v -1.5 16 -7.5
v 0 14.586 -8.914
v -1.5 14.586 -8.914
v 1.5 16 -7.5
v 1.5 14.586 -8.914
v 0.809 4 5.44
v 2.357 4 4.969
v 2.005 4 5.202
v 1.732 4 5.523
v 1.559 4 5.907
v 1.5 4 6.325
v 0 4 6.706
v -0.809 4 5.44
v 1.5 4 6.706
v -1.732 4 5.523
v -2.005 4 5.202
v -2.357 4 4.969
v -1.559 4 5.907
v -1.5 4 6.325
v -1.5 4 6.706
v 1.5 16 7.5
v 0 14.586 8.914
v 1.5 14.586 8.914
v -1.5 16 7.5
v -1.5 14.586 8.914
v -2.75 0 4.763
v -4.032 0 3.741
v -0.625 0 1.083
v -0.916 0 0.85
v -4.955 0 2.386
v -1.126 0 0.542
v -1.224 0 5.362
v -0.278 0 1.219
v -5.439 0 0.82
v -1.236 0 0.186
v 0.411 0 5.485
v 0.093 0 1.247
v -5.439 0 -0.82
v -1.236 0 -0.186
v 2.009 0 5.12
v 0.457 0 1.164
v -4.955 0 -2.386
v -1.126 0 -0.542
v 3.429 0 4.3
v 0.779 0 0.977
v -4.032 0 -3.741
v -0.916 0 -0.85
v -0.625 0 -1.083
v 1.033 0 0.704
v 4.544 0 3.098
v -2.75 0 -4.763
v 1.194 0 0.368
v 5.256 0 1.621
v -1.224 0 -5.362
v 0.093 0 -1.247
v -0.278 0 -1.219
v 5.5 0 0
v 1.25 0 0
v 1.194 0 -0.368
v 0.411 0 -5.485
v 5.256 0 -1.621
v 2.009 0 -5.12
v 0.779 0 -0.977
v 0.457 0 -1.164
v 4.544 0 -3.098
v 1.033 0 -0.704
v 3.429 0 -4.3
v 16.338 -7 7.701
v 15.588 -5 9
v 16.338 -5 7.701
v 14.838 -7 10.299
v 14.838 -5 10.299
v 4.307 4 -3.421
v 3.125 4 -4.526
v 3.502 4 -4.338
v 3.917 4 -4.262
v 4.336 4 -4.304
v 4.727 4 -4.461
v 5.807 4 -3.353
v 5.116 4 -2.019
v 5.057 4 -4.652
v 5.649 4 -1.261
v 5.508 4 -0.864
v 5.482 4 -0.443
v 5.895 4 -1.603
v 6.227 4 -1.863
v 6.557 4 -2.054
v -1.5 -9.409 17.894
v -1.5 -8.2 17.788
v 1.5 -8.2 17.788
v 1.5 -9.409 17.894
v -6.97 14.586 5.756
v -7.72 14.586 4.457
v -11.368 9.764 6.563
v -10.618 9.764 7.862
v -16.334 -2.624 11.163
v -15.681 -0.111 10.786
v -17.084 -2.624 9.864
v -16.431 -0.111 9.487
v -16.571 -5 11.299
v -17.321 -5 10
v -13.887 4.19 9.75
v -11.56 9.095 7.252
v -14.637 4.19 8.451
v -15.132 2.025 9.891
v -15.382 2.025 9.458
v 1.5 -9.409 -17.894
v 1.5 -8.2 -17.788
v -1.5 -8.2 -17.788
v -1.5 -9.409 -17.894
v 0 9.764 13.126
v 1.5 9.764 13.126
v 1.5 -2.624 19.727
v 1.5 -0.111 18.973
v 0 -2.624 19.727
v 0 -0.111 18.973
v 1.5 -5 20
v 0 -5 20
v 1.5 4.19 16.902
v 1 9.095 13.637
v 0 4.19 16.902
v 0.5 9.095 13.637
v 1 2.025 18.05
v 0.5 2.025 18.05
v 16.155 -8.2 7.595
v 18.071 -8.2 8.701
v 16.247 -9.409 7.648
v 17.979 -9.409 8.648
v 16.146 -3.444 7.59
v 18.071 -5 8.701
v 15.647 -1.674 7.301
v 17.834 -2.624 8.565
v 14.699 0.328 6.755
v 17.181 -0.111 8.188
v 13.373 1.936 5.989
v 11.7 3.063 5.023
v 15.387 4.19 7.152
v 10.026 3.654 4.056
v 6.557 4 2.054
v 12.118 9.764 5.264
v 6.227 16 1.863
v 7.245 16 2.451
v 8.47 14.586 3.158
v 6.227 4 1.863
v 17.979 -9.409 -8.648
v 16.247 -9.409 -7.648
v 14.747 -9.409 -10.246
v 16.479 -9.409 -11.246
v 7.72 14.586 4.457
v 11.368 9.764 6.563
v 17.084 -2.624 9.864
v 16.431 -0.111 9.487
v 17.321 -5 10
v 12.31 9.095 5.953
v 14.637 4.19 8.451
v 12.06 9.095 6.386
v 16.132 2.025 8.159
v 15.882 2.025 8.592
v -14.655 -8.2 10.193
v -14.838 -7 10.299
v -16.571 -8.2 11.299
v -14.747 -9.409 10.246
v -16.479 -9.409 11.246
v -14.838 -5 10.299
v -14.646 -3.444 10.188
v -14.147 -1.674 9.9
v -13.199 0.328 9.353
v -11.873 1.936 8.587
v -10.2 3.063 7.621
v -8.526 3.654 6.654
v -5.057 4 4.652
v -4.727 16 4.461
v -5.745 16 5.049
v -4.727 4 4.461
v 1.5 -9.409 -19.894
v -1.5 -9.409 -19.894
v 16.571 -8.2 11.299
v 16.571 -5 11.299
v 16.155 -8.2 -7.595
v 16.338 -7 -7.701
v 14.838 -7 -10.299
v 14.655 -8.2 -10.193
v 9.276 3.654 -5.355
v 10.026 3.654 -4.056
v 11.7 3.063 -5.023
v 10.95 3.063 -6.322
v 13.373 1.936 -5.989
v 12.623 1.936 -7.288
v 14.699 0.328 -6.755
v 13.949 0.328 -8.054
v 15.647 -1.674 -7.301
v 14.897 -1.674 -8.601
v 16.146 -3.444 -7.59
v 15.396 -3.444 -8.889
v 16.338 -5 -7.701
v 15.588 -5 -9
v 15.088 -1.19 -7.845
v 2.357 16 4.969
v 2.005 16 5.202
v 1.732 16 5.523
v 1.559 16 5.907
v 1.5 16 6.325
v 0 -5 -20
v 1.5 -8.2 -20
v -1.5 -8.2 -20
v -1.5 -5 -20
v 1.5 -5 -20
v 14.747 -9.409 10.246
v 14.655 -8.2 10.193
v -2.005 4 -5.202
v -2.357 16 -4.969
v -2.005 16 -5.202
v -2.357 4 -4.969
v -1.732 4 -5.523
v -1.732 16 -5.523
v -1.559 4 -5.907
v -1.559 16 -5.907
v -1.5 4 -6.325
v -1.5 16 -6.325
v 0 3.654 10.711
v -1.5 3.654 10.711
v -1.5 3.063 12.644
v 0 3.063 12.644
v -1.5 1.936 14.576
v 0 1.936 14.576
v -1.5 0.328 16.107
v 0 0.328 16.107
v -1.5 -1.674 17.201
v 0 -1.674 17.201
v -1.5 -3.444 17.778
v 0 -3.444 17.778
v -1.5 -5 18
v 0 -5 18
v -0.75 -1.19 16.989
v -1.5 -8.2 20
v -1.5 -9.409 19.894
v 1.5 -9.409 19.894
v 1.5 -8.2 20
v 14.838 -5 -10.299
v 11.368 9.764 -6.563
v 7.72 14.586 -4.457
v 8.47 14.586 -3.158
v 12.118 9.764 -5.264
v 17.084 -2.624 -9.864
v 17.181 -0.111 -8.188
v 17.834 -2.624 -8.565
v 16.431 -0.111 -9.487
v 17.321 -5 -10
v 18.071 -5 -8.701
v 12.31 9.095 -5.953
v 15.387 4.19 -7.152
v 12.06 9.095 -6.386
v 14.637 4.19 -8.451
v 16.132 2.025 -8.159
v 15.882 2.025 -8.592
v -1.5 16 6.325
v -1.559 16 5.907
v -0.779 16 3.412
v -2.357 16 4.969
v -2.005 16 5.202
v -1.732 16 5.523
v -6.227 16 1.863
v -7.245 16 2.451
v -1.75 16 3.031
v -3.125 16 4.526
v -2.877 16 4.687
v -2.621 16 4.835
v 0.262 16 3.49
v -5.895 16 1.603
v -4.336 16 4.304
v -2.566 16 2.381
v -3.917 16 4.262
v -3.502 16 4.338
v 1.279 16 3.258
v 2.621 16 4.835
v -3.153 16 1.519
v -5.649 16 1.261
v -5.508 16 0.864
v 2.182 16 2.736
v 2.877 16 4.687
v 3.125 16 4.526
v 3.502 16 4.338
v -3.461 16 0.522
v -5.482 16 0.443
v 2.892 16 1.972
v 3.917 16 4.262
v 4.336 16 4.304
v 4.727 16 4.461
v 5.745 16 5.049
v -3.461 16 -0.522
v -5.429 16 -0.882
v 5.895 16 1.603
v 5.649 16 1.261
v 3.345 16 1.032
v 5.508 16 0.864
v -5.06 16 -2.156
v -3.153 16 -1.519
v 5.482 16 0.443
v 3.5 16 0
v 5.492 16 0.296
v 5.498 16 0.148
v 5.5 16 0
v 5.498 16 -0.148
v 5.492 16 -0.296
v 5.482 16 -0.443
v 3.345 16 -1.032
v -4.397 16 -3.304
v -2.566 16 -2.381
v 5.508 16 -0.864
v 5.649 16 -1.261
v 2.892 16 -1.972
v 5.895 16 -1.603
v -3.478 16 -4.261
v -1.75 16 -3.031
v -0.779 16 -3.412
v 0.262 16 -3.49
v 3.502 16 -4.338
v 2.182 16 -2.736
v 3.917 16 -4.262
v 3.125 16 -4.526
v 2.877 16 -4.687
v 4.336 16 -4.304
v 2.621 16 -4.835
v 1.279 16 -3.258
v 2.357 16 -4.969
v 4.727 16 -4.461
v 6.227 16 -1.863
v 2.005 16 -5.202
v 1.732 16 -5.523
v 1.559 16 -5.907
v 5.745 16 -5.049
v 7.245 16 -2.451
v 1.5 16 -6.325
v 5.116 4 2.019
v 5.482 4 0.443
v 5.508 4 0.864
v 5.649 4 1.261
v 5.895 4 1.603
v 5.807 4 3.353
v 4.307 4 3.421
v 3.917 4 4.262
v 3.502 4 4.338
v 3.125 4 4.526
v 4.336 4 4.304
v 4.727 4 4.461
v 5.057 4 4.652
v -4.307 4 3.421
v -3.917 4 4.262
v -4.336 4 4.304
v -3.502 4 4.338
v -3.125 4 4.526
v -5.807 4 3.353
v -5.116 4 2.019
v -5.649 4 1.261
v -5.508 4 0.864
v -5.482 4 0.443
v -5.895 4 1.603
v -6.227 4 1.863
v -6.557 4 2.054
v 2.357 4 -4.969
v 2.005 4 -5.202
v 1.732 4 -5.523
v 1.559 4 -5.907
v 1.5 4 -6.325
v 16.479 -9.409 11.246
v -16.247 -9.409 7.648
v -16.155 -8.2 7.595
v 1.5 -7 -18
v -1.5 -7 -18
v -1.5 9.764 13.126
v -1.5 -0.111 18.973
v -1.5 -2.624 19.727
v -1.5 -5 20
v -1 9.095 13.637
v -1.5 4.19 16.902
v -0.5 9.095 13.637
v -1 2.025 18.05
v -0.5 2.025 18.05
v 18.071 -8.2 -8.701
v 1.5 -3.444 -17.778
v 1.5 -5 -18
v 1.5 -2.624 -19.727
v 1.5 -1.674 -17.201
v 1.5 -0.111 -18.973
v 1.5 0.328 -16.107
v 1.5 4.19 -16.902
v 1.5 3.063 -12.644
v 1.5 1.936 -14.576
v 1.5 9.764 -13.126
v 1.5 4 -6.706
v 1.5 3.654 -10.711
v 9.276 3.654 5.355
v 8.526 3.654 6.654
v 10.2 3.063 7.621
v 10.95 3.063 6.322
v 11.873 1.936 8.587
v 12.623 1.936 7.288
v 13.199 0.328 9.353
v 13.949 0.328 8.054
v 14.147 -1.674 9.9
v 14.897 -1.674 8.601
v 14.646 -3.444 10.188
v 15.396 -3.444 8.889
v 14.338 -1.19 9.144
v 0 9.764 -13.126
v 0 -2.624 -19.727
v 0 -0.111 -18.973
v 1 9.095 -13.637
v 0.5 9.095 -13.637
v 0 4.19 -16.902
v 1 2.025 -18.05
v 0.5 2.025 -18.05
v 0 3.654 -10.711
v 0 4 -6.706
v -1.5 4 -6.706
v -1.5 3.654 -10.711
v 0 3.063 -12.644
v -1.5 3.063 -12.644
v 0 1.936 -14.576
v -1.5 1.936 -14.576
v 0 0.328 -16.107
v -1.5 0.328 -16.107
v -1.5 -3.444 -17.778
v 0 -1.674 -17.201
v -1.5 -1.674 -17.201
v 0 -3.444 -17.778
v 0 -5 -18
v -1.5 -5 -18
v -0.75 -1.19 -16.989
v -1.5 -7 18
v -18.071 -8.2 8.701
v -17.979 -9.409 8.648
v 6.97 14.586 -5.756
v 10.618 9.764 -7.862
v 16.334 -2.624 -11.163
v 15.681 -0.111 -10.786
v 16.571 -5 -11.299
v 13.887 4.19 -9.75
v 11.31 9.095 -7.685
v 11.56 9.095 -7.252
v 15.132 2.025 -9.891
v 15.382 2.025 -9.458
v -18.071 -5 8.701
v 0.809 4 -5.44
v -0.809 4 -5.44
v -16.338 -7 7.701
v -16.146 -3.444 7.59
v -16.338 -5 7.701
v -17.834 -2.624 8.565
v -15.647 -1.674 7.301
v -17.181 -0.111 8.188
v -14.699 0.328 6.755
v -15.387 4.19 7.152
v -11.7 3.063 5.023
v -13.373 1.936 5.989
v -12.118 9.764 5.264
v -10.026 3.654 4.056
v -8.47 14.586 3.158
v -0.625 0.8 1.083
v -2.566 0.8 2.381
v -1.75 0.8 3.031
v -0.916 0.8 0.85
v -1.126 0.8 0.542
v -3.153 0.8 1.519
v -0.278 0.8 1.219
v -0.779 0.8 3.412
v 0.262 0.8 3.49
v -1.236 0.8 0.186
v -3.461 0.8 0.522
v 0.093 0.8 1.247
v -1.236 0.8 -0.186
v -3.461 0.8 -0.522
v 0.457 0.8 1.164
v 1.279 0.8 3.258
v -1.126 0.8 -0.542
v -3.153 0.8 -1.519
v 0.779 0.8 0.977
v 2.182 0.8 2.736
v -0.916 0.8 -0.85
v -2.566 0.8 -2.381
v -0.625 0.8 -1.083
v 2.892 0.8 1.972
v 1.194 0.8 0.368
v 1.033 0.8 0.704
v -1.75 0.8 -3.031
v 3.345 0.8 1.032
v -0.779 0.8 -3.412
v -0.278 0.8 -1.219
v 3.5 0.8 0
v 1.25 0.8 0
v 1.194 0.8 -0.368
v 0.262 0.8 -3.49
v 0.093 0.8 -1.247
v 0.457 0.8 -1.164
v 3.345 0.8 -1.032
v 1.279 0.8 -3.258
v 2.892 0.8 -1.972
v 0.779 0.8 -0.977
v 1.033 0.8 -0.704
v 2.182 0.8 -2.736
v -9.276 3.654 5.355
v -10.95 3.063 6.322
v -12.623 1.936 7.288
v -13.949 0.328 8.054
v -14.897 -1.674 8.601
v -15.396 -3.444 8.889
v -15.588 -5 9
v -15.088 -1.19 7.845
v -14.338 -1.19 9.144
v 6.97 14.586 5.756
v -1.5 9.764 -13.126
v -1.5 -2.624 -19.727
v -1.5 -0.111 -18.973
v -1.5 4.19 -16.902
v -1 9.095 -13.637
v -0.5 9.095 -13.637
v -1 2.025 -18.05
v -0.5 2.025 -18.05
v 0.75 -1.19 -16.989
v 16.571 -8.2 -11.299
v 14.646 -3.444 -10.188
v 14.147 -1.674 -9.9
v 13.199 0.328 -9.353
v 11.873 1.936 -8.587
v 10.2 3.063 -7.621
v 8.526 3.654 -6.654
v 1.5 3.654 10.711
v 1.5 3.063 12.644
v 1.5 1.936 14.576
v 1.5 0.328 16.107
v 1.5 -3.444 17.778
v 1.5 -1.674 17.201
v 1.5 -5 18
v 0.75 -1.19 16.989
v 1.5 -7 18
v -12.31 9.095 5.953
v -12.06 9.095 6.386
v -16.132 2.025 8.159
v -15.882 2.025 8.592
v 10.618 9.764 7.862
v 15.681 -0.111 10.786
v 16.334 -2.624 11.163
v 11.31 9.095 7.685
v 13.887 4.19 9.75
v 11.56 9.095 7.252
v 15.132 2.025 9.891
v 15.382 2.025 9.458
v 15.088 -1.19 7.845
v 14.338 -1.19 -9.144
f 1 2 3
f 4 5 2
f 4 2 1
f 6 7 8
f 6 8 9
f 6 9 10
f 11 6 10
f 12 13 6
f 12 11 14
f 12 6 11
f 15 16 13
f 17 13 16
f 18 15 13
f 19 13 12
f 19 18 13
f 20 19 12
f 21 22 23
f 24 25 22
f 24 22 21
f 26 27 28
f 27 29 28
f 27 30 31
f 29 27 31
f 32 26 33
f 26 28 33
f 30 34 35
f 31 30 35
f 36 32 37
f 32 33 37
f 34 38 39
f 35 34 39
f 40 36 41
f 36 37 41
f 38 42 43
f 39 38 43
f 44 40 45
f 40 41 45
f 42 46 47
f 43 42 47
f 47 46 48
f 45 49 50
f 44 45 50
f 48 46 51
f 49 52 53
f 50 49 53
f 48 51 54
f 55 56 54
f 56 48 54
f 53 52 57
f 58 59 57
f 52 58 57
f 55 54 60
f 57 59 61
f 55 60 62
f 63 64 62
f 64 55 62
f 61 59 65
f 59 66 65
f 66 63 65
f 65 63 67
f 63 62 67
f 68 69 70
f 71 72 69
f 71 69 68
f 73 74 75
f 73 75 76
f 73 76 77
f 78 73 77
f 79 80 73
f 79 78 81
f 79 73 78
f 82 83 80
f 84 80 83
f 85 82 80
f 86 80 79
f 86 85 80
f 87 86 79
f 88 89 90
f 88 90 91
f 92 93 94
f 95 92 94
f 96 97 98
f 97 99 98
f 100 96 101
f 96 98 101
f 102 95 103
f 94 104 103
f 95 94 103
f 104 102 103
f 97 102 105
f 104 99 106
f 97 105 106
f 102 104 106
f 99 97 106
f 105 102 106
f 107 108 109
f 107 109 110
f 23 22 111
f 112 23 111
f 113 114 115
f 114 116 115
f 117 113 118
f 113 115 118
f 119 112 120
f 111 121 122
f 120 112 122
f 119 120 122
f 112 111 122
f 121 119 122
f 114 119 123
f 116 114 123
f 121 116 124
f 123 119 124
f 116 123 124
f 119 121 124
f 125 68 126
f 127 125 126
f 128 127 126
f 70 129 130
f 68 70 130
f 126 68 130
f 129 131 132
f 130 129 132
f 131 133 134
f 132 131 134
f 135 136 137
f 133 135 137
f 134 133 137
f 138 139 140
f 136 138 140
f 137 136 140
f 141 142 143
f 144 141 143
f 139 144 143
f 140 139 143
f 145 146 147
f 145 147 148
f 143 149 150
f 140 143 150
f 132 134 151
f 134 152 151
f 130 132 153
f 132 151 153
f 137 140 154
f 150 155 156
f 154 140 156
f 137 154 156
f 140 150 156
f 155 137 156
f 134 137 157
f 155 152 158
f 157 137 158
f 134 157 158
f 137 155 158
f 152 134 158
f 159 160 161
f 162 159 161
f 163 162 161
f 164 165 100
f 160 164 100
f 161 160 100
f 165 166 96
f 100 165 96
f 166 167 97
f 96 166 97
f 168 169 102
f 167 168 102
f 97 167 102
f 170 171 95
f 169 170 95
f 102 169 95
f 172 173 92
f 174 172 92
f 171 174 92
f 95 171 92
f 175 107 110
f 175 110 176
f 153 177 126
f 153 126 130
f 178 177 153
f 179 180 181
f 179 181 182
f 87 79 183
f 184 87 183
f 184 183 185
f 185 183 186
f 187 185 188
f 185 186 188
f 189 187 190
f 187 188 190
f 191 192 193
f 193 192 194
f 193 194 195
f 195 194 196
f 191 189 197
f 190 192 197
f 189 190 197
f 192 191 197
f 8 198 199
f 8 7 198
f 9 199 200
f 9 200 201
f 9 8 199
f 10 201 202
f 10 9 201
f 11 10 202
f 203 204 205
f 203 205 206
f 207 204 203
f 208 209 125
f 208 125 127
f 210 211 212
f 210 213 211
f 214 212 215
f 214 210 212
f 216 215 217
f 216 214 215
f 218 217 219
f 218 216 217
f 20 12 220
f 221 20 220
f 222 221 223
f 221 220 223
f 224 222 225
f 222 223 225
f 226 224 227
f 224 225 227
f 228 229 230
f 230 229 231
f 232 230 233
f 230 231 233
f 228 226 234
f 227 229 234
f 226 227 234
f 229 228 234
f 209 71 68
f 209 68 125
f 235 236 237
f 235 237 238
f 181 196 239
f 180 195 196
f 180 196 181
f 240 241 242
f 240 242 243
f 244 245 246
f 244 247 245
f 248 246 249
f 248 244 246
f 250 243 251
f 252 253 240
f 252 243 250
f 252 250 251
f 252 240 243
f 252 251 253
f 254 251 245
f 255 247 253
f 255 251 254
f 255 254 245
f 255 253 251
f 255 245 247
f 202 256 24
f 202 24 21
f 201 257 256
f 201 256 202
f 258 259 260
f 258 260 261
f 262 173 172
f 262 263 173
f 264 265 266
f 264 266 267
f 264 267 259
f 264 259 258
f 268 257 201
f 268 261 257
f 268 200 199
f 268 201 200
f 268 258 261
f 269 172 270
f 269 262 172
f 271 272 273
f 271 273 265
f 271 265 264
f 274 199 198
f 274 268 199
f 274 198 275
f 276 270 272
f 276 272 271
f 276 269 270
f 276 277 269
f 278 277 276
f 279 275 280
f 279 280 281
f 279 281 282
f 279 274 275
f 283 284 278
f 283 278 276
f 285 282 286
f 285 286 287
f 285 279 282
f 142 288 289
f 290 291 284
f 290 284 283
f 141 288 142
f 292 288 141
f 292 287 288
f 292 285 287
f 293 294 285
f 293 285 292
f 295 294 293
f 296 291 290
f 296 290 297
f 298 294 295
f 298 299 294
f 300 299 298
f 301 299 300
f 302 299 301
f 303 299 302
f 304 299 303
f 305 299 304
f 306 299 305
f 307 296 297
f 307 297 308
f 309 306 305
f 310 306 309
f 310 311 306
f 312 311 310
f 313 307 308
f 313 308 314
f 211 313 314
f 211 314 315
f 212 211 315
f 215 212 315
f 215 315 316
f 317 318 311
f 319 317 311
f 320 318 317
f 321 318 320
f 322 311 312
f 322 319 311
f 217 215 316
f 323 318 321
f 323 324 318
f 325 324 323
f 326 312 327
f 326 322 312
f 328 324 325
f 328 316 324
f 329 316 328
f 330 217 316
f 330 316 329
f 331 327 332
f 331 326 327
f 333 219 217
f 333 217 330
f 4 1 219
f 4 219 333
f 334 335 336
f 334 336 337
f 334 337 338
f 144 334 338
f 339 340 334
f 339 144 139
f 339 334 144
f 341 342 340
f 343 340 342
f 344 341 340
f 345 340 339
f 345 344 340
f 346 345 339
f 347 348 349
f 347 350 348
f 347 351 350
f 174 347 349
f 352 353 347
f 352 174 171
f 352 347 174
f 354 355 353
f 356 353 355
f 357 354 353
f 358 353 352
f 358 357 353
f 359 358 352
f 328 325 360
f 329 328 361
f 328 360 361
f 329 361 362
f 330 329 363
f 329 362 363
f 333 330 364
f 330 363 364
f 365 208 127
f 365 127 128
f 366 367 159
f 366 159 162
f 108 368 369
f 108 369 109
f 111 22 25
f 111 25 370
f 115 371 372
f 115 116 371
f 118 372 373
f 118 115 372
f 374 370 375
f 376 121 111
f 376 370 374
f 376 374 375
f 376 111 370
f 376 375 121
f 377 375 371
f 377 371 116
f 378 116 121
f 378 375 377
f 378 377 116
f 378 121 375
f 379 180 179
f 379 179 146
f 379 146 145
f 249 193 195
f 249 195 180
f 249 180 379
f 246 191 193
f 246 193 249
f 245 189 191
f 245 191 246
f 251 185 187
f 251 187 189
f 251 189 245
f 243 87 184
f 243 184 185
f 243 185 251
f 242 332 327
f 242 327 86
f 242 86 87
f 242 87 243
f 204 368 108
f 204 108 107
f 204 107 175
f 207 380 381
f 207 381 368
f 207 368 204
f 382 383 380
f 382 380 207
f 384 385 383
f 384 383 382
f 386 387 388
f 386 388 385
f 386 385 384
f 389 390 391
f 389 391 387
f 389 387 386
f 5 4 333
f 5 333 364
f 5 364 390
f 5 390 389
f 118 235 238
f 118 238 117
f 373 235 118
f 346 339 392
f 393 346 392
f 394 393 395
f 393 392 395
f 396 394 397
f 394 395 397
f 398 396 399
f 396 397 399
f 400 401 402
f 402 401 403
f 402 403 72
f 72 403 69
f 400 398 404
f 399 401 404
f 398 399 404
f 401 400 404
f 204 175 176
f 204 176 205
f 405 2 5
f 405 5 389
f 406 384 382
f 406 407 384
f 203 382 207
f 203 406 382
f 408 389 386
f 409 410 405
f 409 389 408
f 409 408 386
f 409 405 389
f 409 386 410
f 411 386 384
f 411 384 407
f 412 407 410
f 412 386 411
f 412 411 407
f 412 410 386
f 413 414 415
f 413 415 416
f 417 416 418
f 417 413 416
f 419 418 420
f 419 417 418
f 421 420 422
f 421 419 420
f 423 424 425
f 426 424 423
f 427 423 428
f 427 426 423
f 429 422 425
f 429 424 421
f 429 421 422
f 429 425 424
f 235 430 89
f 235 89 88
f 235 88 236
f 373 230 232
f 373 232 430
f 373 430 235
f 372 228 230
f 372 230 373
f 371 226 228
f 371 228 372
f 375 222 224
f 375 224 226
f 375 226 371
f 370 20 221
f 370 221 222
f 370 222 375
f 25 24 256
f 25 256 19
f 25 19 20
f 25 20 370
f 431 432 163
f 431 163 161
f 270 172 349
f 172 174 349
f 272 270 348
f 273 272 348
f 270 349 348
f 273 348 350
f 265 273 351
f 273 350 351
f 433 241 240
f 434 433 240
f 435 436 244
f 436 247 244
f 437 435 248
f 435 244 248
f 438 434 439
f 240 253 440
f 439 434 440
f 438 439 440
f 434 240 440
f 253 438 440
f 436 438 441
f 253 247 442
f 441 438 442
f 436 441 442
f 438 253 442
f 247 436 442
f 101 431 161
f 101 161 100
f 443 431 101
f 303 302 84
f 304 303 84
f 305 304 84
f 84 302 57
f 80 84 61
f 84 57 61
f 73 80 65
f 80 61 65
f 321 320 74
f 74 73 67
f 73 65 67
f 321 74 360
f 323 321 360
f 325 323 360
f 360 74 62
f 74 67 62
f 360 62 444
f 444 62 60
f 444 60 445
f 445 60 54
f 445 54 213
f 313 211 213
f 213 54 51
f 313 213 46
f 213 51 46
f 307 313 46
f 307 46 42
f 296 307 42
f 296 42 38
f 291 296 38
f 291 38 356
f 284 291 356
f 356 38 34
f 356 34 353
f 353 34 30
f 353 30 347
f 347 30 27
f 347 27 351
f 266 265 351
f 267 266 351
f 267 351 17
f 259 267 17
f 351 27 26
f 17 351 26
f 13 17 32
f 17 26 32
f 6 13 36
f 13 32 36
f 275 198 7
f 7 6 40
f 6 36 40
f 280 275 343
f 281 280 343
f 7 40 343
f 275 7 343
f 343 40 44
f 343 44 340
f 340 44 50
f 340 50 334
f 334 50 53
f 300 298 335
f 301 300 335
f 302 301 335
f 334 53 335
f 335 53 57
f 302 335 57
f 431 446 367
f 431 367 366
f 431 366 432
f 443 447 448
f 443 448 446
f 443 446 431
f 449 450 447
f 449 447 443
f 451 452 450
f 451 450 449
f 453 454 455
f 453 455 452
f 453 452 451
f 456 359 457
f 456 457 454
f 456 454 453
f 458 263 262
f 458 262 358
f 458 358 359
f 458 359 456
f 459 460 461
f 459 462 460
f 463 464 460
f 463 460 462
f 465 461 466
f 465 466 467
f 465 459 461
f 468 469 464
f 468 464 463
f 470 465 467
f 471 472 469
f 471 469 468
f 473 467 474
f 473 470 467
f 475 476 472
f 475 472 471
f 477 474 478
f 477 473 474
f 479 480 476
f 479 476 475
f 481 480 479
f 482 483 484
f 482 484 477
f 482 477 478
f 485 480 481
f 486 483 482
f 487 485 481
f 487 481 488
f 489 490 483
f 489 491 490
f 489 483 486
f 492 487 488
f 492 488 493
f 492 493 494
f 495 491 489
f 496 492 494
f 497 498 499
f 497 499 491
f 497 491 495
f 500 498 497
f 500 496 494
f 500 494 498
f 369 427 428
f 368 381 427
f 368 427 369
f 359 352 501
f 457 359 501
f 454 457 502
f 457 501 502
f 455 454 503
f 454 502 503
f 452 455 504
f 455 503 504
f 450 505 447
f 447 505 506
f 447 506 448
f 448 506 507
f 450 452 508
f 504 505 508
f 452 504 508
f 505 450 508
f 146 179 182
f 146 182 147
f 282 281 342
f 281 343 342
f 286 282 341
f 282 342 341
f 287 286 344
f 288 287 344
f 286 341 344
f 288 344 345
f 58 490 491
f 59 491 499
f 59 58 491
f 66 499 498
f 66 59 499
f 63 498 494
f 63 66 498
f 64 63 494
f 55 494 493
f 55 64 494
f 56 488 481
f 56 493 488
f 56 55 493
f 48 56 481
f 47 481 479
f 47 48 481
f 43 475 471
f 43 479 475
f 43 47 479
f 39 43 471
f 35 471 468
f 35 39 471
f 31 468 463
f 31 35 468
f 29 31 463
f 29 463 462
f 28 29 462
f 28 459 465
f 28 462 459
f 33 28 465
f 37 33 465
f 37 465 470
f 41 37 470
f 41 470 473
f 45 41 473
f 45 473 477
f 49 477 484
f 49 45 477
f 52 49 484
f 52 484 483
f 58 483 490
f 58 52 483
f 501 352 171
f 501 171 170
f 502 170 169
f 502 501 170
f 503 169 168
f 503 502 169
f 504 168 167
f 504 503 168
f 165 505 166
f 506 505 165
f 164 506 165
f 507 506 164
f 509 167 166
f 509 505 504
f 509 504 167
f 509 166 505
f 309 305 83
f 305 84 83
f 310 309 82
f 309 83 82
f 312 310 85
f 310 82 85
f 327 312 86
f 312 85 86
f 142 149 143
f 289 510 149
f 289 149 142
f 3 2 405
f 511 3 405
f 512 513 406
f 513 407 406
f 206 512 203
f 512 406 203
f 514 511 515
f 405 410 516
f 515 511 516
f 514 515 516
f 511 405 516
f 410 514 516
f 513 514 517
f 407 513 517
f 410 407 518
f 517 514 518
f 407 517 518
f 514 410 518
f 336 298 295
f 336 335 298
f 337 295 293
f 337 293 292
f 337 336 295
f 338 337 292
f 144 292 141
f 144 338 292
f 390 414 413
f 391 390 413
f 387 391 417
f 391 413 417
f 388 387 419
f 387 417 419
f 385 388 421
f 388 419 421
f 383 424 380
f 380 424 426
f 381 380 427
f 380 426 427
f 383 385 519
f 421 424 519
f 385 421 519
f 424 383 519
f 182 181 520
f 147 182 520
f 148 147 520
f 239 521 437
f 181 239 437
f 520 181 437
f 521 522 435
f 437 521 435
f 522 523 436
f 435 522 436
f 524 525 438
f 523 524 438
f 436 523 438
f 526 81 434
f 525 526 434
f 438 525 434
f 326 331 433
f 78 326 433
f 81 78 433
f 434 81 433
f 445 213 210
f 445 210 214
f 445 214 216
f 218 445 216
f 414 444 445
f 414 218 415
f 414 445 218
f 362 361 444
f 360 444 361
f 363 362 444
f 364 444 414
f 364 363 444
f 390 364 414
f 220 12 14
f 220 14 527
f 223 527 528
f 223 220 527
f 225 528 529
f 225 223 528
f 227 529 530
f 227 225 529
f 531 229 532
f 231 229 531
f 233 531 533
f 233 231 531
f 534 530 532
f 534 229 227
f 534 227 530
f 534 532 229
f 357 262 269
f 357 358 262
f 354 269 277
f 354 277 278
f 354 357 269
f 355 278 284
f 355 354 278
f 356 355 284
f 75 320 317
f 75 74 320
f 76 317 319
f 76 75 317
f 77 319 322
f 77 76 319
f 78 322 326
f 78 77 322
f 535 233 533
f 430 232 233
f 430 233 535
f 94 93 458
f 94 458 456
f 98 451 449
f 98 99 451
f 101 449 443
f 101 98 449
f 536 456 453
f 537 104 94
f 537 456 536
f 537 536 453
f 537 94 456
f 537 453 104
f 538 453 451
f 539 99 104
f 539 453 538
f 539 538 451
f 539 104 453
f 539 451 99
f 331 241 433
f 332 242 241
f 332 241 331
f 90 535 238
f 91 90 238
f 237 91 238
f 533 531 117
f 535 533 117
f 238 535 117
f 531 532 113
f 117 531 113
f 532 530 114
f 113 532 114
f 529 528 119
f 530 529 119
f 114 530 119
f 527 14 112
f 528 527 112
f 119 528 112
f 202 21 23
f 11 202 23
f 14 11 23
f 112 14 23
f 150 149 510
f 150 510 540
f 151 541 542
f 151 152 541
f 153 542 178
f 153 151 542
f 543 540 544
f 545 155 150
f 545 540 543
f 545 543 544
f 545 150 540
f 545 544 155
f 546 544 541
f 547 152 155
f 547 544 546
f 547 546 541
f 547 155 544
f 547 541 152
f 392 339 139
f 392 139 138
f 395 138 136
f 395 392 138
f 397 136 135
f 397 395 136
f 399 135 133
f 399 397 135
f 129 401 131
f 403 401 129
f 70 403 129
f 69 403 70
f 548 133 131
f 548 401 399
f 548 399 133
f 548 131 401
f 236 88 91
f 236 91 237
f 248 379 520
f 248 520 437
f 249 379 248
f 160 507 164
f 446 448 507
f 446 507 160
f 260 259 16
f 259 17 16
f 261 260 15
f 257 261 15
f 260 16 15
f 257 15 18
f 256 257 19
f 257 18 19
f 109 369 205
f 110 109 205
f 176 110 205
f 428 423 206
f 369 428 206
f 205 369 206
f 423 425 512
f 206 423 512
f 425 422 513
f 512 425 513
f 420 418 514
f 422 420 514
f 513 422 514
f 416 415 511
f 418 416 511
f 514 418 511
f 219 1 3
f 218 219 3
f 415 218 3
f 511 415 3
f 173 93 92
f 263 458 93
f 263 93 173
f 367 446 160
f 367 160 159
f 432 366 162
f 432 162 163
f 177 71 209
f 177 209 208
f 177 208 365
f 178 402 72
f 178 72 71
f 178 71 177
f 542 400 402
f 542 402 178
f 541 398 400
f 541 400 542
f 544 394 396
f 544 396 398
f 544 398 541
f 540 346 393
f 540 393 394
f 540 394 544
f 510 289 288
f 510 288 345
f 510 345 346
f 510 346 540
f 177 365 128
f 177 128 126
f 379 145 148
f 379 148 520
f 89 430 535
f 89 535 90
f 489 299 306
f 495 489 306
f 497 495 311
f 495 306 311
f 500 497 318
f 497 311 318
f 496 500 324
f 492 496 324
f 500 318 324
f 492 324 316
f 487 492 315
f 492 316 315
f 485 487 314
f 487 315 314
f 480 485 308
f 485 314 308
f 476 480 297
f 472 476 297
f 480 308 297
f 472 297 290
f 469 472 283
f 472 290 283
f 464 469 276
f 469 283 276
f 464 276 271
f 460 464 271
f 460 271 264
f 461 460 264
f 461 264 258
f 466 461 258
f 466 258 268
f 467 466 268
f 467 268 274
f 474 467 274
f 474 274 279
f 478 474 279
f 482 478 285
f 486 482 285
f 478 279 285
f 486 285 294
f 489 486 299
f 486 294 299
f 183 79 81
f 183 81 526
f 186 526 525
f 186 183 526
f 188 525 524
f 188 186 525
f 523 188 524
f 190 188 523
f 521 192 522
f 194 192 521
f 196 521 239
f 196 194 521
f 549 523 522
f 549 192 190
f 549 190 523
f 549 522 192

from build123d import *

# Parameters (mm, degrees)
SKETCH1_R           = 5.5
SKETCH1_R_2         = 1.25
BOSS_EXTRUDE1_DEPTH = 16
BOSS_EXTRUDE2_DEPTH = 1.5
BOSS_EXTRUDE3_DEPTH = 3
CIRPATTERN1_COUNT   = 5
CIRPATTERN1_ANGLE   = 240
FILLET1_R           = 1.5
SKETCH6_R           = 3.5
CUT_EXTRUDE1_DEPTH  = 15.2


with BuildPart() as part:
    # Sketch1 → Boss-Extrude1 (new body)
    with BuildSketch(Plane(origin=(0, 0, 0), x_dir=(1, 0, 0), z_dir=(0, 1, 0))):
        Circle(SKETCH1_R)
        Circle(SKETCH1_R_2, mode=Mode.SUBTRACT)
    extrude(amount=BOSS_EXTRUDE1_DEPTH)

    # Sketch2 → Boss-Extrude2 (add, symmetric)
    with BuildSketch(Plane(origin=(0, 0, 0), x_dir=(0, 0, -1), z_dir=(1, 0, 0))):
        with BuildLine():
            Line((18, -5), (20, -5))
            add(Edge.make_bspline(
                [(8.914213562, 14.585786438), (13.074333826, 10.425666174), (20, 1.461761402), (20, -5)],
                knots=[0.14734609, 0.14734609, 0.14734609, 0.14734609, 1, 1, 1, 1], degree=3))
            Line((8.914213562, 14.585786438), (7.5, 16))
            Line((7.5, 16), (5.5, 16))
            Line((5.5, 16), (1.25, 16))
            Line((1.25, 16), (1.25, 4))
            Line((1.25, 4), (6.70571865, 4))
            add(Edge.make_bspline(
                [(6.70571865, 4), (10.522194615, 4), (16.021169224, 3.257262603), (18, -4.005650027), (18, -5)],
                knots=[0, 0, 0, 0, 0.785490543, 1, 1, 1, 1], degree=3))
        make_face()
    boss_extrude2 = extrude(amount=BOSS_EXTRUDE2_DEPTH, both=True)

    # Sketch8 → Boss-Extrude3 (add)
    with BuildSketch(Plane(origin=(1.5, 0, 0), x_dir=(0, 0, -1), z_dir=(1, 0, 0))):
        Polygon((18, -7), (17.788407623, -8.2), (17.894203812, -9.409255967), (19.894203812, -9.409255967), (20, -8.2), (20, -7), (20, -5), (18, -5), align=None)
    boss_extrude3 = extrude(amount=-BOSS_EXTRUDE3_DEPTH)

    # CirPattern1: Boss-Extrude2, Boss-Extrude3 ×5 about axis
    cirpattern1_axis = Axis((0, 16, 0), (0, -1, 0))
    for i in range(1, CIRPATTERN1_COUNT):
        add(boss_extrude2.rotate(cirpattern1_axis, i * CIRPATTERN1_ANGLE / (CIRPATTERN1_COUNT - 1)))
        add(boss_extrude3.rotate(cirpattern1_axis, i * CIRPATTERN1_ANGLE / (CIRPATTERN1_COUNT - 1)))

    # Fillet1
    fillet1_edges = [part.edges().sort_by_distance(p)[0] for p in [
        (-5.332575695, 10, 1.346713205),
        (1.5, 10, -5.291502622),
        (-1.5, 10, -5.291502622),
        (3.832575695, 10, -3.944789417),
        (5.332575695, 10, 1.346713205),
        (1.5, 10, 5.291502622),
        (-3.832575695, 10, 3.944789417),
        (5.332575695, 10, -1.346713205),
        (3.832575695, 10, 3.944789417),
        (-1.5, 10, 5.291502622),
    ]]
    fillet(fillet1_edges, radius=FILLET1_R)

    # Sketch6 → Cut-Extrude1 (cut)
    with BuildSketch(Plane(origin=(0, 16, 0), x_dir=(1, 0, 0), z_dir=(0, 1, 0))):
        Circle(SKETCH6_R)
    extrude(amount=-CUT_EXTRUDE1_DEPTH, mode=Mode.SUBTRACT)


solid = part.part
